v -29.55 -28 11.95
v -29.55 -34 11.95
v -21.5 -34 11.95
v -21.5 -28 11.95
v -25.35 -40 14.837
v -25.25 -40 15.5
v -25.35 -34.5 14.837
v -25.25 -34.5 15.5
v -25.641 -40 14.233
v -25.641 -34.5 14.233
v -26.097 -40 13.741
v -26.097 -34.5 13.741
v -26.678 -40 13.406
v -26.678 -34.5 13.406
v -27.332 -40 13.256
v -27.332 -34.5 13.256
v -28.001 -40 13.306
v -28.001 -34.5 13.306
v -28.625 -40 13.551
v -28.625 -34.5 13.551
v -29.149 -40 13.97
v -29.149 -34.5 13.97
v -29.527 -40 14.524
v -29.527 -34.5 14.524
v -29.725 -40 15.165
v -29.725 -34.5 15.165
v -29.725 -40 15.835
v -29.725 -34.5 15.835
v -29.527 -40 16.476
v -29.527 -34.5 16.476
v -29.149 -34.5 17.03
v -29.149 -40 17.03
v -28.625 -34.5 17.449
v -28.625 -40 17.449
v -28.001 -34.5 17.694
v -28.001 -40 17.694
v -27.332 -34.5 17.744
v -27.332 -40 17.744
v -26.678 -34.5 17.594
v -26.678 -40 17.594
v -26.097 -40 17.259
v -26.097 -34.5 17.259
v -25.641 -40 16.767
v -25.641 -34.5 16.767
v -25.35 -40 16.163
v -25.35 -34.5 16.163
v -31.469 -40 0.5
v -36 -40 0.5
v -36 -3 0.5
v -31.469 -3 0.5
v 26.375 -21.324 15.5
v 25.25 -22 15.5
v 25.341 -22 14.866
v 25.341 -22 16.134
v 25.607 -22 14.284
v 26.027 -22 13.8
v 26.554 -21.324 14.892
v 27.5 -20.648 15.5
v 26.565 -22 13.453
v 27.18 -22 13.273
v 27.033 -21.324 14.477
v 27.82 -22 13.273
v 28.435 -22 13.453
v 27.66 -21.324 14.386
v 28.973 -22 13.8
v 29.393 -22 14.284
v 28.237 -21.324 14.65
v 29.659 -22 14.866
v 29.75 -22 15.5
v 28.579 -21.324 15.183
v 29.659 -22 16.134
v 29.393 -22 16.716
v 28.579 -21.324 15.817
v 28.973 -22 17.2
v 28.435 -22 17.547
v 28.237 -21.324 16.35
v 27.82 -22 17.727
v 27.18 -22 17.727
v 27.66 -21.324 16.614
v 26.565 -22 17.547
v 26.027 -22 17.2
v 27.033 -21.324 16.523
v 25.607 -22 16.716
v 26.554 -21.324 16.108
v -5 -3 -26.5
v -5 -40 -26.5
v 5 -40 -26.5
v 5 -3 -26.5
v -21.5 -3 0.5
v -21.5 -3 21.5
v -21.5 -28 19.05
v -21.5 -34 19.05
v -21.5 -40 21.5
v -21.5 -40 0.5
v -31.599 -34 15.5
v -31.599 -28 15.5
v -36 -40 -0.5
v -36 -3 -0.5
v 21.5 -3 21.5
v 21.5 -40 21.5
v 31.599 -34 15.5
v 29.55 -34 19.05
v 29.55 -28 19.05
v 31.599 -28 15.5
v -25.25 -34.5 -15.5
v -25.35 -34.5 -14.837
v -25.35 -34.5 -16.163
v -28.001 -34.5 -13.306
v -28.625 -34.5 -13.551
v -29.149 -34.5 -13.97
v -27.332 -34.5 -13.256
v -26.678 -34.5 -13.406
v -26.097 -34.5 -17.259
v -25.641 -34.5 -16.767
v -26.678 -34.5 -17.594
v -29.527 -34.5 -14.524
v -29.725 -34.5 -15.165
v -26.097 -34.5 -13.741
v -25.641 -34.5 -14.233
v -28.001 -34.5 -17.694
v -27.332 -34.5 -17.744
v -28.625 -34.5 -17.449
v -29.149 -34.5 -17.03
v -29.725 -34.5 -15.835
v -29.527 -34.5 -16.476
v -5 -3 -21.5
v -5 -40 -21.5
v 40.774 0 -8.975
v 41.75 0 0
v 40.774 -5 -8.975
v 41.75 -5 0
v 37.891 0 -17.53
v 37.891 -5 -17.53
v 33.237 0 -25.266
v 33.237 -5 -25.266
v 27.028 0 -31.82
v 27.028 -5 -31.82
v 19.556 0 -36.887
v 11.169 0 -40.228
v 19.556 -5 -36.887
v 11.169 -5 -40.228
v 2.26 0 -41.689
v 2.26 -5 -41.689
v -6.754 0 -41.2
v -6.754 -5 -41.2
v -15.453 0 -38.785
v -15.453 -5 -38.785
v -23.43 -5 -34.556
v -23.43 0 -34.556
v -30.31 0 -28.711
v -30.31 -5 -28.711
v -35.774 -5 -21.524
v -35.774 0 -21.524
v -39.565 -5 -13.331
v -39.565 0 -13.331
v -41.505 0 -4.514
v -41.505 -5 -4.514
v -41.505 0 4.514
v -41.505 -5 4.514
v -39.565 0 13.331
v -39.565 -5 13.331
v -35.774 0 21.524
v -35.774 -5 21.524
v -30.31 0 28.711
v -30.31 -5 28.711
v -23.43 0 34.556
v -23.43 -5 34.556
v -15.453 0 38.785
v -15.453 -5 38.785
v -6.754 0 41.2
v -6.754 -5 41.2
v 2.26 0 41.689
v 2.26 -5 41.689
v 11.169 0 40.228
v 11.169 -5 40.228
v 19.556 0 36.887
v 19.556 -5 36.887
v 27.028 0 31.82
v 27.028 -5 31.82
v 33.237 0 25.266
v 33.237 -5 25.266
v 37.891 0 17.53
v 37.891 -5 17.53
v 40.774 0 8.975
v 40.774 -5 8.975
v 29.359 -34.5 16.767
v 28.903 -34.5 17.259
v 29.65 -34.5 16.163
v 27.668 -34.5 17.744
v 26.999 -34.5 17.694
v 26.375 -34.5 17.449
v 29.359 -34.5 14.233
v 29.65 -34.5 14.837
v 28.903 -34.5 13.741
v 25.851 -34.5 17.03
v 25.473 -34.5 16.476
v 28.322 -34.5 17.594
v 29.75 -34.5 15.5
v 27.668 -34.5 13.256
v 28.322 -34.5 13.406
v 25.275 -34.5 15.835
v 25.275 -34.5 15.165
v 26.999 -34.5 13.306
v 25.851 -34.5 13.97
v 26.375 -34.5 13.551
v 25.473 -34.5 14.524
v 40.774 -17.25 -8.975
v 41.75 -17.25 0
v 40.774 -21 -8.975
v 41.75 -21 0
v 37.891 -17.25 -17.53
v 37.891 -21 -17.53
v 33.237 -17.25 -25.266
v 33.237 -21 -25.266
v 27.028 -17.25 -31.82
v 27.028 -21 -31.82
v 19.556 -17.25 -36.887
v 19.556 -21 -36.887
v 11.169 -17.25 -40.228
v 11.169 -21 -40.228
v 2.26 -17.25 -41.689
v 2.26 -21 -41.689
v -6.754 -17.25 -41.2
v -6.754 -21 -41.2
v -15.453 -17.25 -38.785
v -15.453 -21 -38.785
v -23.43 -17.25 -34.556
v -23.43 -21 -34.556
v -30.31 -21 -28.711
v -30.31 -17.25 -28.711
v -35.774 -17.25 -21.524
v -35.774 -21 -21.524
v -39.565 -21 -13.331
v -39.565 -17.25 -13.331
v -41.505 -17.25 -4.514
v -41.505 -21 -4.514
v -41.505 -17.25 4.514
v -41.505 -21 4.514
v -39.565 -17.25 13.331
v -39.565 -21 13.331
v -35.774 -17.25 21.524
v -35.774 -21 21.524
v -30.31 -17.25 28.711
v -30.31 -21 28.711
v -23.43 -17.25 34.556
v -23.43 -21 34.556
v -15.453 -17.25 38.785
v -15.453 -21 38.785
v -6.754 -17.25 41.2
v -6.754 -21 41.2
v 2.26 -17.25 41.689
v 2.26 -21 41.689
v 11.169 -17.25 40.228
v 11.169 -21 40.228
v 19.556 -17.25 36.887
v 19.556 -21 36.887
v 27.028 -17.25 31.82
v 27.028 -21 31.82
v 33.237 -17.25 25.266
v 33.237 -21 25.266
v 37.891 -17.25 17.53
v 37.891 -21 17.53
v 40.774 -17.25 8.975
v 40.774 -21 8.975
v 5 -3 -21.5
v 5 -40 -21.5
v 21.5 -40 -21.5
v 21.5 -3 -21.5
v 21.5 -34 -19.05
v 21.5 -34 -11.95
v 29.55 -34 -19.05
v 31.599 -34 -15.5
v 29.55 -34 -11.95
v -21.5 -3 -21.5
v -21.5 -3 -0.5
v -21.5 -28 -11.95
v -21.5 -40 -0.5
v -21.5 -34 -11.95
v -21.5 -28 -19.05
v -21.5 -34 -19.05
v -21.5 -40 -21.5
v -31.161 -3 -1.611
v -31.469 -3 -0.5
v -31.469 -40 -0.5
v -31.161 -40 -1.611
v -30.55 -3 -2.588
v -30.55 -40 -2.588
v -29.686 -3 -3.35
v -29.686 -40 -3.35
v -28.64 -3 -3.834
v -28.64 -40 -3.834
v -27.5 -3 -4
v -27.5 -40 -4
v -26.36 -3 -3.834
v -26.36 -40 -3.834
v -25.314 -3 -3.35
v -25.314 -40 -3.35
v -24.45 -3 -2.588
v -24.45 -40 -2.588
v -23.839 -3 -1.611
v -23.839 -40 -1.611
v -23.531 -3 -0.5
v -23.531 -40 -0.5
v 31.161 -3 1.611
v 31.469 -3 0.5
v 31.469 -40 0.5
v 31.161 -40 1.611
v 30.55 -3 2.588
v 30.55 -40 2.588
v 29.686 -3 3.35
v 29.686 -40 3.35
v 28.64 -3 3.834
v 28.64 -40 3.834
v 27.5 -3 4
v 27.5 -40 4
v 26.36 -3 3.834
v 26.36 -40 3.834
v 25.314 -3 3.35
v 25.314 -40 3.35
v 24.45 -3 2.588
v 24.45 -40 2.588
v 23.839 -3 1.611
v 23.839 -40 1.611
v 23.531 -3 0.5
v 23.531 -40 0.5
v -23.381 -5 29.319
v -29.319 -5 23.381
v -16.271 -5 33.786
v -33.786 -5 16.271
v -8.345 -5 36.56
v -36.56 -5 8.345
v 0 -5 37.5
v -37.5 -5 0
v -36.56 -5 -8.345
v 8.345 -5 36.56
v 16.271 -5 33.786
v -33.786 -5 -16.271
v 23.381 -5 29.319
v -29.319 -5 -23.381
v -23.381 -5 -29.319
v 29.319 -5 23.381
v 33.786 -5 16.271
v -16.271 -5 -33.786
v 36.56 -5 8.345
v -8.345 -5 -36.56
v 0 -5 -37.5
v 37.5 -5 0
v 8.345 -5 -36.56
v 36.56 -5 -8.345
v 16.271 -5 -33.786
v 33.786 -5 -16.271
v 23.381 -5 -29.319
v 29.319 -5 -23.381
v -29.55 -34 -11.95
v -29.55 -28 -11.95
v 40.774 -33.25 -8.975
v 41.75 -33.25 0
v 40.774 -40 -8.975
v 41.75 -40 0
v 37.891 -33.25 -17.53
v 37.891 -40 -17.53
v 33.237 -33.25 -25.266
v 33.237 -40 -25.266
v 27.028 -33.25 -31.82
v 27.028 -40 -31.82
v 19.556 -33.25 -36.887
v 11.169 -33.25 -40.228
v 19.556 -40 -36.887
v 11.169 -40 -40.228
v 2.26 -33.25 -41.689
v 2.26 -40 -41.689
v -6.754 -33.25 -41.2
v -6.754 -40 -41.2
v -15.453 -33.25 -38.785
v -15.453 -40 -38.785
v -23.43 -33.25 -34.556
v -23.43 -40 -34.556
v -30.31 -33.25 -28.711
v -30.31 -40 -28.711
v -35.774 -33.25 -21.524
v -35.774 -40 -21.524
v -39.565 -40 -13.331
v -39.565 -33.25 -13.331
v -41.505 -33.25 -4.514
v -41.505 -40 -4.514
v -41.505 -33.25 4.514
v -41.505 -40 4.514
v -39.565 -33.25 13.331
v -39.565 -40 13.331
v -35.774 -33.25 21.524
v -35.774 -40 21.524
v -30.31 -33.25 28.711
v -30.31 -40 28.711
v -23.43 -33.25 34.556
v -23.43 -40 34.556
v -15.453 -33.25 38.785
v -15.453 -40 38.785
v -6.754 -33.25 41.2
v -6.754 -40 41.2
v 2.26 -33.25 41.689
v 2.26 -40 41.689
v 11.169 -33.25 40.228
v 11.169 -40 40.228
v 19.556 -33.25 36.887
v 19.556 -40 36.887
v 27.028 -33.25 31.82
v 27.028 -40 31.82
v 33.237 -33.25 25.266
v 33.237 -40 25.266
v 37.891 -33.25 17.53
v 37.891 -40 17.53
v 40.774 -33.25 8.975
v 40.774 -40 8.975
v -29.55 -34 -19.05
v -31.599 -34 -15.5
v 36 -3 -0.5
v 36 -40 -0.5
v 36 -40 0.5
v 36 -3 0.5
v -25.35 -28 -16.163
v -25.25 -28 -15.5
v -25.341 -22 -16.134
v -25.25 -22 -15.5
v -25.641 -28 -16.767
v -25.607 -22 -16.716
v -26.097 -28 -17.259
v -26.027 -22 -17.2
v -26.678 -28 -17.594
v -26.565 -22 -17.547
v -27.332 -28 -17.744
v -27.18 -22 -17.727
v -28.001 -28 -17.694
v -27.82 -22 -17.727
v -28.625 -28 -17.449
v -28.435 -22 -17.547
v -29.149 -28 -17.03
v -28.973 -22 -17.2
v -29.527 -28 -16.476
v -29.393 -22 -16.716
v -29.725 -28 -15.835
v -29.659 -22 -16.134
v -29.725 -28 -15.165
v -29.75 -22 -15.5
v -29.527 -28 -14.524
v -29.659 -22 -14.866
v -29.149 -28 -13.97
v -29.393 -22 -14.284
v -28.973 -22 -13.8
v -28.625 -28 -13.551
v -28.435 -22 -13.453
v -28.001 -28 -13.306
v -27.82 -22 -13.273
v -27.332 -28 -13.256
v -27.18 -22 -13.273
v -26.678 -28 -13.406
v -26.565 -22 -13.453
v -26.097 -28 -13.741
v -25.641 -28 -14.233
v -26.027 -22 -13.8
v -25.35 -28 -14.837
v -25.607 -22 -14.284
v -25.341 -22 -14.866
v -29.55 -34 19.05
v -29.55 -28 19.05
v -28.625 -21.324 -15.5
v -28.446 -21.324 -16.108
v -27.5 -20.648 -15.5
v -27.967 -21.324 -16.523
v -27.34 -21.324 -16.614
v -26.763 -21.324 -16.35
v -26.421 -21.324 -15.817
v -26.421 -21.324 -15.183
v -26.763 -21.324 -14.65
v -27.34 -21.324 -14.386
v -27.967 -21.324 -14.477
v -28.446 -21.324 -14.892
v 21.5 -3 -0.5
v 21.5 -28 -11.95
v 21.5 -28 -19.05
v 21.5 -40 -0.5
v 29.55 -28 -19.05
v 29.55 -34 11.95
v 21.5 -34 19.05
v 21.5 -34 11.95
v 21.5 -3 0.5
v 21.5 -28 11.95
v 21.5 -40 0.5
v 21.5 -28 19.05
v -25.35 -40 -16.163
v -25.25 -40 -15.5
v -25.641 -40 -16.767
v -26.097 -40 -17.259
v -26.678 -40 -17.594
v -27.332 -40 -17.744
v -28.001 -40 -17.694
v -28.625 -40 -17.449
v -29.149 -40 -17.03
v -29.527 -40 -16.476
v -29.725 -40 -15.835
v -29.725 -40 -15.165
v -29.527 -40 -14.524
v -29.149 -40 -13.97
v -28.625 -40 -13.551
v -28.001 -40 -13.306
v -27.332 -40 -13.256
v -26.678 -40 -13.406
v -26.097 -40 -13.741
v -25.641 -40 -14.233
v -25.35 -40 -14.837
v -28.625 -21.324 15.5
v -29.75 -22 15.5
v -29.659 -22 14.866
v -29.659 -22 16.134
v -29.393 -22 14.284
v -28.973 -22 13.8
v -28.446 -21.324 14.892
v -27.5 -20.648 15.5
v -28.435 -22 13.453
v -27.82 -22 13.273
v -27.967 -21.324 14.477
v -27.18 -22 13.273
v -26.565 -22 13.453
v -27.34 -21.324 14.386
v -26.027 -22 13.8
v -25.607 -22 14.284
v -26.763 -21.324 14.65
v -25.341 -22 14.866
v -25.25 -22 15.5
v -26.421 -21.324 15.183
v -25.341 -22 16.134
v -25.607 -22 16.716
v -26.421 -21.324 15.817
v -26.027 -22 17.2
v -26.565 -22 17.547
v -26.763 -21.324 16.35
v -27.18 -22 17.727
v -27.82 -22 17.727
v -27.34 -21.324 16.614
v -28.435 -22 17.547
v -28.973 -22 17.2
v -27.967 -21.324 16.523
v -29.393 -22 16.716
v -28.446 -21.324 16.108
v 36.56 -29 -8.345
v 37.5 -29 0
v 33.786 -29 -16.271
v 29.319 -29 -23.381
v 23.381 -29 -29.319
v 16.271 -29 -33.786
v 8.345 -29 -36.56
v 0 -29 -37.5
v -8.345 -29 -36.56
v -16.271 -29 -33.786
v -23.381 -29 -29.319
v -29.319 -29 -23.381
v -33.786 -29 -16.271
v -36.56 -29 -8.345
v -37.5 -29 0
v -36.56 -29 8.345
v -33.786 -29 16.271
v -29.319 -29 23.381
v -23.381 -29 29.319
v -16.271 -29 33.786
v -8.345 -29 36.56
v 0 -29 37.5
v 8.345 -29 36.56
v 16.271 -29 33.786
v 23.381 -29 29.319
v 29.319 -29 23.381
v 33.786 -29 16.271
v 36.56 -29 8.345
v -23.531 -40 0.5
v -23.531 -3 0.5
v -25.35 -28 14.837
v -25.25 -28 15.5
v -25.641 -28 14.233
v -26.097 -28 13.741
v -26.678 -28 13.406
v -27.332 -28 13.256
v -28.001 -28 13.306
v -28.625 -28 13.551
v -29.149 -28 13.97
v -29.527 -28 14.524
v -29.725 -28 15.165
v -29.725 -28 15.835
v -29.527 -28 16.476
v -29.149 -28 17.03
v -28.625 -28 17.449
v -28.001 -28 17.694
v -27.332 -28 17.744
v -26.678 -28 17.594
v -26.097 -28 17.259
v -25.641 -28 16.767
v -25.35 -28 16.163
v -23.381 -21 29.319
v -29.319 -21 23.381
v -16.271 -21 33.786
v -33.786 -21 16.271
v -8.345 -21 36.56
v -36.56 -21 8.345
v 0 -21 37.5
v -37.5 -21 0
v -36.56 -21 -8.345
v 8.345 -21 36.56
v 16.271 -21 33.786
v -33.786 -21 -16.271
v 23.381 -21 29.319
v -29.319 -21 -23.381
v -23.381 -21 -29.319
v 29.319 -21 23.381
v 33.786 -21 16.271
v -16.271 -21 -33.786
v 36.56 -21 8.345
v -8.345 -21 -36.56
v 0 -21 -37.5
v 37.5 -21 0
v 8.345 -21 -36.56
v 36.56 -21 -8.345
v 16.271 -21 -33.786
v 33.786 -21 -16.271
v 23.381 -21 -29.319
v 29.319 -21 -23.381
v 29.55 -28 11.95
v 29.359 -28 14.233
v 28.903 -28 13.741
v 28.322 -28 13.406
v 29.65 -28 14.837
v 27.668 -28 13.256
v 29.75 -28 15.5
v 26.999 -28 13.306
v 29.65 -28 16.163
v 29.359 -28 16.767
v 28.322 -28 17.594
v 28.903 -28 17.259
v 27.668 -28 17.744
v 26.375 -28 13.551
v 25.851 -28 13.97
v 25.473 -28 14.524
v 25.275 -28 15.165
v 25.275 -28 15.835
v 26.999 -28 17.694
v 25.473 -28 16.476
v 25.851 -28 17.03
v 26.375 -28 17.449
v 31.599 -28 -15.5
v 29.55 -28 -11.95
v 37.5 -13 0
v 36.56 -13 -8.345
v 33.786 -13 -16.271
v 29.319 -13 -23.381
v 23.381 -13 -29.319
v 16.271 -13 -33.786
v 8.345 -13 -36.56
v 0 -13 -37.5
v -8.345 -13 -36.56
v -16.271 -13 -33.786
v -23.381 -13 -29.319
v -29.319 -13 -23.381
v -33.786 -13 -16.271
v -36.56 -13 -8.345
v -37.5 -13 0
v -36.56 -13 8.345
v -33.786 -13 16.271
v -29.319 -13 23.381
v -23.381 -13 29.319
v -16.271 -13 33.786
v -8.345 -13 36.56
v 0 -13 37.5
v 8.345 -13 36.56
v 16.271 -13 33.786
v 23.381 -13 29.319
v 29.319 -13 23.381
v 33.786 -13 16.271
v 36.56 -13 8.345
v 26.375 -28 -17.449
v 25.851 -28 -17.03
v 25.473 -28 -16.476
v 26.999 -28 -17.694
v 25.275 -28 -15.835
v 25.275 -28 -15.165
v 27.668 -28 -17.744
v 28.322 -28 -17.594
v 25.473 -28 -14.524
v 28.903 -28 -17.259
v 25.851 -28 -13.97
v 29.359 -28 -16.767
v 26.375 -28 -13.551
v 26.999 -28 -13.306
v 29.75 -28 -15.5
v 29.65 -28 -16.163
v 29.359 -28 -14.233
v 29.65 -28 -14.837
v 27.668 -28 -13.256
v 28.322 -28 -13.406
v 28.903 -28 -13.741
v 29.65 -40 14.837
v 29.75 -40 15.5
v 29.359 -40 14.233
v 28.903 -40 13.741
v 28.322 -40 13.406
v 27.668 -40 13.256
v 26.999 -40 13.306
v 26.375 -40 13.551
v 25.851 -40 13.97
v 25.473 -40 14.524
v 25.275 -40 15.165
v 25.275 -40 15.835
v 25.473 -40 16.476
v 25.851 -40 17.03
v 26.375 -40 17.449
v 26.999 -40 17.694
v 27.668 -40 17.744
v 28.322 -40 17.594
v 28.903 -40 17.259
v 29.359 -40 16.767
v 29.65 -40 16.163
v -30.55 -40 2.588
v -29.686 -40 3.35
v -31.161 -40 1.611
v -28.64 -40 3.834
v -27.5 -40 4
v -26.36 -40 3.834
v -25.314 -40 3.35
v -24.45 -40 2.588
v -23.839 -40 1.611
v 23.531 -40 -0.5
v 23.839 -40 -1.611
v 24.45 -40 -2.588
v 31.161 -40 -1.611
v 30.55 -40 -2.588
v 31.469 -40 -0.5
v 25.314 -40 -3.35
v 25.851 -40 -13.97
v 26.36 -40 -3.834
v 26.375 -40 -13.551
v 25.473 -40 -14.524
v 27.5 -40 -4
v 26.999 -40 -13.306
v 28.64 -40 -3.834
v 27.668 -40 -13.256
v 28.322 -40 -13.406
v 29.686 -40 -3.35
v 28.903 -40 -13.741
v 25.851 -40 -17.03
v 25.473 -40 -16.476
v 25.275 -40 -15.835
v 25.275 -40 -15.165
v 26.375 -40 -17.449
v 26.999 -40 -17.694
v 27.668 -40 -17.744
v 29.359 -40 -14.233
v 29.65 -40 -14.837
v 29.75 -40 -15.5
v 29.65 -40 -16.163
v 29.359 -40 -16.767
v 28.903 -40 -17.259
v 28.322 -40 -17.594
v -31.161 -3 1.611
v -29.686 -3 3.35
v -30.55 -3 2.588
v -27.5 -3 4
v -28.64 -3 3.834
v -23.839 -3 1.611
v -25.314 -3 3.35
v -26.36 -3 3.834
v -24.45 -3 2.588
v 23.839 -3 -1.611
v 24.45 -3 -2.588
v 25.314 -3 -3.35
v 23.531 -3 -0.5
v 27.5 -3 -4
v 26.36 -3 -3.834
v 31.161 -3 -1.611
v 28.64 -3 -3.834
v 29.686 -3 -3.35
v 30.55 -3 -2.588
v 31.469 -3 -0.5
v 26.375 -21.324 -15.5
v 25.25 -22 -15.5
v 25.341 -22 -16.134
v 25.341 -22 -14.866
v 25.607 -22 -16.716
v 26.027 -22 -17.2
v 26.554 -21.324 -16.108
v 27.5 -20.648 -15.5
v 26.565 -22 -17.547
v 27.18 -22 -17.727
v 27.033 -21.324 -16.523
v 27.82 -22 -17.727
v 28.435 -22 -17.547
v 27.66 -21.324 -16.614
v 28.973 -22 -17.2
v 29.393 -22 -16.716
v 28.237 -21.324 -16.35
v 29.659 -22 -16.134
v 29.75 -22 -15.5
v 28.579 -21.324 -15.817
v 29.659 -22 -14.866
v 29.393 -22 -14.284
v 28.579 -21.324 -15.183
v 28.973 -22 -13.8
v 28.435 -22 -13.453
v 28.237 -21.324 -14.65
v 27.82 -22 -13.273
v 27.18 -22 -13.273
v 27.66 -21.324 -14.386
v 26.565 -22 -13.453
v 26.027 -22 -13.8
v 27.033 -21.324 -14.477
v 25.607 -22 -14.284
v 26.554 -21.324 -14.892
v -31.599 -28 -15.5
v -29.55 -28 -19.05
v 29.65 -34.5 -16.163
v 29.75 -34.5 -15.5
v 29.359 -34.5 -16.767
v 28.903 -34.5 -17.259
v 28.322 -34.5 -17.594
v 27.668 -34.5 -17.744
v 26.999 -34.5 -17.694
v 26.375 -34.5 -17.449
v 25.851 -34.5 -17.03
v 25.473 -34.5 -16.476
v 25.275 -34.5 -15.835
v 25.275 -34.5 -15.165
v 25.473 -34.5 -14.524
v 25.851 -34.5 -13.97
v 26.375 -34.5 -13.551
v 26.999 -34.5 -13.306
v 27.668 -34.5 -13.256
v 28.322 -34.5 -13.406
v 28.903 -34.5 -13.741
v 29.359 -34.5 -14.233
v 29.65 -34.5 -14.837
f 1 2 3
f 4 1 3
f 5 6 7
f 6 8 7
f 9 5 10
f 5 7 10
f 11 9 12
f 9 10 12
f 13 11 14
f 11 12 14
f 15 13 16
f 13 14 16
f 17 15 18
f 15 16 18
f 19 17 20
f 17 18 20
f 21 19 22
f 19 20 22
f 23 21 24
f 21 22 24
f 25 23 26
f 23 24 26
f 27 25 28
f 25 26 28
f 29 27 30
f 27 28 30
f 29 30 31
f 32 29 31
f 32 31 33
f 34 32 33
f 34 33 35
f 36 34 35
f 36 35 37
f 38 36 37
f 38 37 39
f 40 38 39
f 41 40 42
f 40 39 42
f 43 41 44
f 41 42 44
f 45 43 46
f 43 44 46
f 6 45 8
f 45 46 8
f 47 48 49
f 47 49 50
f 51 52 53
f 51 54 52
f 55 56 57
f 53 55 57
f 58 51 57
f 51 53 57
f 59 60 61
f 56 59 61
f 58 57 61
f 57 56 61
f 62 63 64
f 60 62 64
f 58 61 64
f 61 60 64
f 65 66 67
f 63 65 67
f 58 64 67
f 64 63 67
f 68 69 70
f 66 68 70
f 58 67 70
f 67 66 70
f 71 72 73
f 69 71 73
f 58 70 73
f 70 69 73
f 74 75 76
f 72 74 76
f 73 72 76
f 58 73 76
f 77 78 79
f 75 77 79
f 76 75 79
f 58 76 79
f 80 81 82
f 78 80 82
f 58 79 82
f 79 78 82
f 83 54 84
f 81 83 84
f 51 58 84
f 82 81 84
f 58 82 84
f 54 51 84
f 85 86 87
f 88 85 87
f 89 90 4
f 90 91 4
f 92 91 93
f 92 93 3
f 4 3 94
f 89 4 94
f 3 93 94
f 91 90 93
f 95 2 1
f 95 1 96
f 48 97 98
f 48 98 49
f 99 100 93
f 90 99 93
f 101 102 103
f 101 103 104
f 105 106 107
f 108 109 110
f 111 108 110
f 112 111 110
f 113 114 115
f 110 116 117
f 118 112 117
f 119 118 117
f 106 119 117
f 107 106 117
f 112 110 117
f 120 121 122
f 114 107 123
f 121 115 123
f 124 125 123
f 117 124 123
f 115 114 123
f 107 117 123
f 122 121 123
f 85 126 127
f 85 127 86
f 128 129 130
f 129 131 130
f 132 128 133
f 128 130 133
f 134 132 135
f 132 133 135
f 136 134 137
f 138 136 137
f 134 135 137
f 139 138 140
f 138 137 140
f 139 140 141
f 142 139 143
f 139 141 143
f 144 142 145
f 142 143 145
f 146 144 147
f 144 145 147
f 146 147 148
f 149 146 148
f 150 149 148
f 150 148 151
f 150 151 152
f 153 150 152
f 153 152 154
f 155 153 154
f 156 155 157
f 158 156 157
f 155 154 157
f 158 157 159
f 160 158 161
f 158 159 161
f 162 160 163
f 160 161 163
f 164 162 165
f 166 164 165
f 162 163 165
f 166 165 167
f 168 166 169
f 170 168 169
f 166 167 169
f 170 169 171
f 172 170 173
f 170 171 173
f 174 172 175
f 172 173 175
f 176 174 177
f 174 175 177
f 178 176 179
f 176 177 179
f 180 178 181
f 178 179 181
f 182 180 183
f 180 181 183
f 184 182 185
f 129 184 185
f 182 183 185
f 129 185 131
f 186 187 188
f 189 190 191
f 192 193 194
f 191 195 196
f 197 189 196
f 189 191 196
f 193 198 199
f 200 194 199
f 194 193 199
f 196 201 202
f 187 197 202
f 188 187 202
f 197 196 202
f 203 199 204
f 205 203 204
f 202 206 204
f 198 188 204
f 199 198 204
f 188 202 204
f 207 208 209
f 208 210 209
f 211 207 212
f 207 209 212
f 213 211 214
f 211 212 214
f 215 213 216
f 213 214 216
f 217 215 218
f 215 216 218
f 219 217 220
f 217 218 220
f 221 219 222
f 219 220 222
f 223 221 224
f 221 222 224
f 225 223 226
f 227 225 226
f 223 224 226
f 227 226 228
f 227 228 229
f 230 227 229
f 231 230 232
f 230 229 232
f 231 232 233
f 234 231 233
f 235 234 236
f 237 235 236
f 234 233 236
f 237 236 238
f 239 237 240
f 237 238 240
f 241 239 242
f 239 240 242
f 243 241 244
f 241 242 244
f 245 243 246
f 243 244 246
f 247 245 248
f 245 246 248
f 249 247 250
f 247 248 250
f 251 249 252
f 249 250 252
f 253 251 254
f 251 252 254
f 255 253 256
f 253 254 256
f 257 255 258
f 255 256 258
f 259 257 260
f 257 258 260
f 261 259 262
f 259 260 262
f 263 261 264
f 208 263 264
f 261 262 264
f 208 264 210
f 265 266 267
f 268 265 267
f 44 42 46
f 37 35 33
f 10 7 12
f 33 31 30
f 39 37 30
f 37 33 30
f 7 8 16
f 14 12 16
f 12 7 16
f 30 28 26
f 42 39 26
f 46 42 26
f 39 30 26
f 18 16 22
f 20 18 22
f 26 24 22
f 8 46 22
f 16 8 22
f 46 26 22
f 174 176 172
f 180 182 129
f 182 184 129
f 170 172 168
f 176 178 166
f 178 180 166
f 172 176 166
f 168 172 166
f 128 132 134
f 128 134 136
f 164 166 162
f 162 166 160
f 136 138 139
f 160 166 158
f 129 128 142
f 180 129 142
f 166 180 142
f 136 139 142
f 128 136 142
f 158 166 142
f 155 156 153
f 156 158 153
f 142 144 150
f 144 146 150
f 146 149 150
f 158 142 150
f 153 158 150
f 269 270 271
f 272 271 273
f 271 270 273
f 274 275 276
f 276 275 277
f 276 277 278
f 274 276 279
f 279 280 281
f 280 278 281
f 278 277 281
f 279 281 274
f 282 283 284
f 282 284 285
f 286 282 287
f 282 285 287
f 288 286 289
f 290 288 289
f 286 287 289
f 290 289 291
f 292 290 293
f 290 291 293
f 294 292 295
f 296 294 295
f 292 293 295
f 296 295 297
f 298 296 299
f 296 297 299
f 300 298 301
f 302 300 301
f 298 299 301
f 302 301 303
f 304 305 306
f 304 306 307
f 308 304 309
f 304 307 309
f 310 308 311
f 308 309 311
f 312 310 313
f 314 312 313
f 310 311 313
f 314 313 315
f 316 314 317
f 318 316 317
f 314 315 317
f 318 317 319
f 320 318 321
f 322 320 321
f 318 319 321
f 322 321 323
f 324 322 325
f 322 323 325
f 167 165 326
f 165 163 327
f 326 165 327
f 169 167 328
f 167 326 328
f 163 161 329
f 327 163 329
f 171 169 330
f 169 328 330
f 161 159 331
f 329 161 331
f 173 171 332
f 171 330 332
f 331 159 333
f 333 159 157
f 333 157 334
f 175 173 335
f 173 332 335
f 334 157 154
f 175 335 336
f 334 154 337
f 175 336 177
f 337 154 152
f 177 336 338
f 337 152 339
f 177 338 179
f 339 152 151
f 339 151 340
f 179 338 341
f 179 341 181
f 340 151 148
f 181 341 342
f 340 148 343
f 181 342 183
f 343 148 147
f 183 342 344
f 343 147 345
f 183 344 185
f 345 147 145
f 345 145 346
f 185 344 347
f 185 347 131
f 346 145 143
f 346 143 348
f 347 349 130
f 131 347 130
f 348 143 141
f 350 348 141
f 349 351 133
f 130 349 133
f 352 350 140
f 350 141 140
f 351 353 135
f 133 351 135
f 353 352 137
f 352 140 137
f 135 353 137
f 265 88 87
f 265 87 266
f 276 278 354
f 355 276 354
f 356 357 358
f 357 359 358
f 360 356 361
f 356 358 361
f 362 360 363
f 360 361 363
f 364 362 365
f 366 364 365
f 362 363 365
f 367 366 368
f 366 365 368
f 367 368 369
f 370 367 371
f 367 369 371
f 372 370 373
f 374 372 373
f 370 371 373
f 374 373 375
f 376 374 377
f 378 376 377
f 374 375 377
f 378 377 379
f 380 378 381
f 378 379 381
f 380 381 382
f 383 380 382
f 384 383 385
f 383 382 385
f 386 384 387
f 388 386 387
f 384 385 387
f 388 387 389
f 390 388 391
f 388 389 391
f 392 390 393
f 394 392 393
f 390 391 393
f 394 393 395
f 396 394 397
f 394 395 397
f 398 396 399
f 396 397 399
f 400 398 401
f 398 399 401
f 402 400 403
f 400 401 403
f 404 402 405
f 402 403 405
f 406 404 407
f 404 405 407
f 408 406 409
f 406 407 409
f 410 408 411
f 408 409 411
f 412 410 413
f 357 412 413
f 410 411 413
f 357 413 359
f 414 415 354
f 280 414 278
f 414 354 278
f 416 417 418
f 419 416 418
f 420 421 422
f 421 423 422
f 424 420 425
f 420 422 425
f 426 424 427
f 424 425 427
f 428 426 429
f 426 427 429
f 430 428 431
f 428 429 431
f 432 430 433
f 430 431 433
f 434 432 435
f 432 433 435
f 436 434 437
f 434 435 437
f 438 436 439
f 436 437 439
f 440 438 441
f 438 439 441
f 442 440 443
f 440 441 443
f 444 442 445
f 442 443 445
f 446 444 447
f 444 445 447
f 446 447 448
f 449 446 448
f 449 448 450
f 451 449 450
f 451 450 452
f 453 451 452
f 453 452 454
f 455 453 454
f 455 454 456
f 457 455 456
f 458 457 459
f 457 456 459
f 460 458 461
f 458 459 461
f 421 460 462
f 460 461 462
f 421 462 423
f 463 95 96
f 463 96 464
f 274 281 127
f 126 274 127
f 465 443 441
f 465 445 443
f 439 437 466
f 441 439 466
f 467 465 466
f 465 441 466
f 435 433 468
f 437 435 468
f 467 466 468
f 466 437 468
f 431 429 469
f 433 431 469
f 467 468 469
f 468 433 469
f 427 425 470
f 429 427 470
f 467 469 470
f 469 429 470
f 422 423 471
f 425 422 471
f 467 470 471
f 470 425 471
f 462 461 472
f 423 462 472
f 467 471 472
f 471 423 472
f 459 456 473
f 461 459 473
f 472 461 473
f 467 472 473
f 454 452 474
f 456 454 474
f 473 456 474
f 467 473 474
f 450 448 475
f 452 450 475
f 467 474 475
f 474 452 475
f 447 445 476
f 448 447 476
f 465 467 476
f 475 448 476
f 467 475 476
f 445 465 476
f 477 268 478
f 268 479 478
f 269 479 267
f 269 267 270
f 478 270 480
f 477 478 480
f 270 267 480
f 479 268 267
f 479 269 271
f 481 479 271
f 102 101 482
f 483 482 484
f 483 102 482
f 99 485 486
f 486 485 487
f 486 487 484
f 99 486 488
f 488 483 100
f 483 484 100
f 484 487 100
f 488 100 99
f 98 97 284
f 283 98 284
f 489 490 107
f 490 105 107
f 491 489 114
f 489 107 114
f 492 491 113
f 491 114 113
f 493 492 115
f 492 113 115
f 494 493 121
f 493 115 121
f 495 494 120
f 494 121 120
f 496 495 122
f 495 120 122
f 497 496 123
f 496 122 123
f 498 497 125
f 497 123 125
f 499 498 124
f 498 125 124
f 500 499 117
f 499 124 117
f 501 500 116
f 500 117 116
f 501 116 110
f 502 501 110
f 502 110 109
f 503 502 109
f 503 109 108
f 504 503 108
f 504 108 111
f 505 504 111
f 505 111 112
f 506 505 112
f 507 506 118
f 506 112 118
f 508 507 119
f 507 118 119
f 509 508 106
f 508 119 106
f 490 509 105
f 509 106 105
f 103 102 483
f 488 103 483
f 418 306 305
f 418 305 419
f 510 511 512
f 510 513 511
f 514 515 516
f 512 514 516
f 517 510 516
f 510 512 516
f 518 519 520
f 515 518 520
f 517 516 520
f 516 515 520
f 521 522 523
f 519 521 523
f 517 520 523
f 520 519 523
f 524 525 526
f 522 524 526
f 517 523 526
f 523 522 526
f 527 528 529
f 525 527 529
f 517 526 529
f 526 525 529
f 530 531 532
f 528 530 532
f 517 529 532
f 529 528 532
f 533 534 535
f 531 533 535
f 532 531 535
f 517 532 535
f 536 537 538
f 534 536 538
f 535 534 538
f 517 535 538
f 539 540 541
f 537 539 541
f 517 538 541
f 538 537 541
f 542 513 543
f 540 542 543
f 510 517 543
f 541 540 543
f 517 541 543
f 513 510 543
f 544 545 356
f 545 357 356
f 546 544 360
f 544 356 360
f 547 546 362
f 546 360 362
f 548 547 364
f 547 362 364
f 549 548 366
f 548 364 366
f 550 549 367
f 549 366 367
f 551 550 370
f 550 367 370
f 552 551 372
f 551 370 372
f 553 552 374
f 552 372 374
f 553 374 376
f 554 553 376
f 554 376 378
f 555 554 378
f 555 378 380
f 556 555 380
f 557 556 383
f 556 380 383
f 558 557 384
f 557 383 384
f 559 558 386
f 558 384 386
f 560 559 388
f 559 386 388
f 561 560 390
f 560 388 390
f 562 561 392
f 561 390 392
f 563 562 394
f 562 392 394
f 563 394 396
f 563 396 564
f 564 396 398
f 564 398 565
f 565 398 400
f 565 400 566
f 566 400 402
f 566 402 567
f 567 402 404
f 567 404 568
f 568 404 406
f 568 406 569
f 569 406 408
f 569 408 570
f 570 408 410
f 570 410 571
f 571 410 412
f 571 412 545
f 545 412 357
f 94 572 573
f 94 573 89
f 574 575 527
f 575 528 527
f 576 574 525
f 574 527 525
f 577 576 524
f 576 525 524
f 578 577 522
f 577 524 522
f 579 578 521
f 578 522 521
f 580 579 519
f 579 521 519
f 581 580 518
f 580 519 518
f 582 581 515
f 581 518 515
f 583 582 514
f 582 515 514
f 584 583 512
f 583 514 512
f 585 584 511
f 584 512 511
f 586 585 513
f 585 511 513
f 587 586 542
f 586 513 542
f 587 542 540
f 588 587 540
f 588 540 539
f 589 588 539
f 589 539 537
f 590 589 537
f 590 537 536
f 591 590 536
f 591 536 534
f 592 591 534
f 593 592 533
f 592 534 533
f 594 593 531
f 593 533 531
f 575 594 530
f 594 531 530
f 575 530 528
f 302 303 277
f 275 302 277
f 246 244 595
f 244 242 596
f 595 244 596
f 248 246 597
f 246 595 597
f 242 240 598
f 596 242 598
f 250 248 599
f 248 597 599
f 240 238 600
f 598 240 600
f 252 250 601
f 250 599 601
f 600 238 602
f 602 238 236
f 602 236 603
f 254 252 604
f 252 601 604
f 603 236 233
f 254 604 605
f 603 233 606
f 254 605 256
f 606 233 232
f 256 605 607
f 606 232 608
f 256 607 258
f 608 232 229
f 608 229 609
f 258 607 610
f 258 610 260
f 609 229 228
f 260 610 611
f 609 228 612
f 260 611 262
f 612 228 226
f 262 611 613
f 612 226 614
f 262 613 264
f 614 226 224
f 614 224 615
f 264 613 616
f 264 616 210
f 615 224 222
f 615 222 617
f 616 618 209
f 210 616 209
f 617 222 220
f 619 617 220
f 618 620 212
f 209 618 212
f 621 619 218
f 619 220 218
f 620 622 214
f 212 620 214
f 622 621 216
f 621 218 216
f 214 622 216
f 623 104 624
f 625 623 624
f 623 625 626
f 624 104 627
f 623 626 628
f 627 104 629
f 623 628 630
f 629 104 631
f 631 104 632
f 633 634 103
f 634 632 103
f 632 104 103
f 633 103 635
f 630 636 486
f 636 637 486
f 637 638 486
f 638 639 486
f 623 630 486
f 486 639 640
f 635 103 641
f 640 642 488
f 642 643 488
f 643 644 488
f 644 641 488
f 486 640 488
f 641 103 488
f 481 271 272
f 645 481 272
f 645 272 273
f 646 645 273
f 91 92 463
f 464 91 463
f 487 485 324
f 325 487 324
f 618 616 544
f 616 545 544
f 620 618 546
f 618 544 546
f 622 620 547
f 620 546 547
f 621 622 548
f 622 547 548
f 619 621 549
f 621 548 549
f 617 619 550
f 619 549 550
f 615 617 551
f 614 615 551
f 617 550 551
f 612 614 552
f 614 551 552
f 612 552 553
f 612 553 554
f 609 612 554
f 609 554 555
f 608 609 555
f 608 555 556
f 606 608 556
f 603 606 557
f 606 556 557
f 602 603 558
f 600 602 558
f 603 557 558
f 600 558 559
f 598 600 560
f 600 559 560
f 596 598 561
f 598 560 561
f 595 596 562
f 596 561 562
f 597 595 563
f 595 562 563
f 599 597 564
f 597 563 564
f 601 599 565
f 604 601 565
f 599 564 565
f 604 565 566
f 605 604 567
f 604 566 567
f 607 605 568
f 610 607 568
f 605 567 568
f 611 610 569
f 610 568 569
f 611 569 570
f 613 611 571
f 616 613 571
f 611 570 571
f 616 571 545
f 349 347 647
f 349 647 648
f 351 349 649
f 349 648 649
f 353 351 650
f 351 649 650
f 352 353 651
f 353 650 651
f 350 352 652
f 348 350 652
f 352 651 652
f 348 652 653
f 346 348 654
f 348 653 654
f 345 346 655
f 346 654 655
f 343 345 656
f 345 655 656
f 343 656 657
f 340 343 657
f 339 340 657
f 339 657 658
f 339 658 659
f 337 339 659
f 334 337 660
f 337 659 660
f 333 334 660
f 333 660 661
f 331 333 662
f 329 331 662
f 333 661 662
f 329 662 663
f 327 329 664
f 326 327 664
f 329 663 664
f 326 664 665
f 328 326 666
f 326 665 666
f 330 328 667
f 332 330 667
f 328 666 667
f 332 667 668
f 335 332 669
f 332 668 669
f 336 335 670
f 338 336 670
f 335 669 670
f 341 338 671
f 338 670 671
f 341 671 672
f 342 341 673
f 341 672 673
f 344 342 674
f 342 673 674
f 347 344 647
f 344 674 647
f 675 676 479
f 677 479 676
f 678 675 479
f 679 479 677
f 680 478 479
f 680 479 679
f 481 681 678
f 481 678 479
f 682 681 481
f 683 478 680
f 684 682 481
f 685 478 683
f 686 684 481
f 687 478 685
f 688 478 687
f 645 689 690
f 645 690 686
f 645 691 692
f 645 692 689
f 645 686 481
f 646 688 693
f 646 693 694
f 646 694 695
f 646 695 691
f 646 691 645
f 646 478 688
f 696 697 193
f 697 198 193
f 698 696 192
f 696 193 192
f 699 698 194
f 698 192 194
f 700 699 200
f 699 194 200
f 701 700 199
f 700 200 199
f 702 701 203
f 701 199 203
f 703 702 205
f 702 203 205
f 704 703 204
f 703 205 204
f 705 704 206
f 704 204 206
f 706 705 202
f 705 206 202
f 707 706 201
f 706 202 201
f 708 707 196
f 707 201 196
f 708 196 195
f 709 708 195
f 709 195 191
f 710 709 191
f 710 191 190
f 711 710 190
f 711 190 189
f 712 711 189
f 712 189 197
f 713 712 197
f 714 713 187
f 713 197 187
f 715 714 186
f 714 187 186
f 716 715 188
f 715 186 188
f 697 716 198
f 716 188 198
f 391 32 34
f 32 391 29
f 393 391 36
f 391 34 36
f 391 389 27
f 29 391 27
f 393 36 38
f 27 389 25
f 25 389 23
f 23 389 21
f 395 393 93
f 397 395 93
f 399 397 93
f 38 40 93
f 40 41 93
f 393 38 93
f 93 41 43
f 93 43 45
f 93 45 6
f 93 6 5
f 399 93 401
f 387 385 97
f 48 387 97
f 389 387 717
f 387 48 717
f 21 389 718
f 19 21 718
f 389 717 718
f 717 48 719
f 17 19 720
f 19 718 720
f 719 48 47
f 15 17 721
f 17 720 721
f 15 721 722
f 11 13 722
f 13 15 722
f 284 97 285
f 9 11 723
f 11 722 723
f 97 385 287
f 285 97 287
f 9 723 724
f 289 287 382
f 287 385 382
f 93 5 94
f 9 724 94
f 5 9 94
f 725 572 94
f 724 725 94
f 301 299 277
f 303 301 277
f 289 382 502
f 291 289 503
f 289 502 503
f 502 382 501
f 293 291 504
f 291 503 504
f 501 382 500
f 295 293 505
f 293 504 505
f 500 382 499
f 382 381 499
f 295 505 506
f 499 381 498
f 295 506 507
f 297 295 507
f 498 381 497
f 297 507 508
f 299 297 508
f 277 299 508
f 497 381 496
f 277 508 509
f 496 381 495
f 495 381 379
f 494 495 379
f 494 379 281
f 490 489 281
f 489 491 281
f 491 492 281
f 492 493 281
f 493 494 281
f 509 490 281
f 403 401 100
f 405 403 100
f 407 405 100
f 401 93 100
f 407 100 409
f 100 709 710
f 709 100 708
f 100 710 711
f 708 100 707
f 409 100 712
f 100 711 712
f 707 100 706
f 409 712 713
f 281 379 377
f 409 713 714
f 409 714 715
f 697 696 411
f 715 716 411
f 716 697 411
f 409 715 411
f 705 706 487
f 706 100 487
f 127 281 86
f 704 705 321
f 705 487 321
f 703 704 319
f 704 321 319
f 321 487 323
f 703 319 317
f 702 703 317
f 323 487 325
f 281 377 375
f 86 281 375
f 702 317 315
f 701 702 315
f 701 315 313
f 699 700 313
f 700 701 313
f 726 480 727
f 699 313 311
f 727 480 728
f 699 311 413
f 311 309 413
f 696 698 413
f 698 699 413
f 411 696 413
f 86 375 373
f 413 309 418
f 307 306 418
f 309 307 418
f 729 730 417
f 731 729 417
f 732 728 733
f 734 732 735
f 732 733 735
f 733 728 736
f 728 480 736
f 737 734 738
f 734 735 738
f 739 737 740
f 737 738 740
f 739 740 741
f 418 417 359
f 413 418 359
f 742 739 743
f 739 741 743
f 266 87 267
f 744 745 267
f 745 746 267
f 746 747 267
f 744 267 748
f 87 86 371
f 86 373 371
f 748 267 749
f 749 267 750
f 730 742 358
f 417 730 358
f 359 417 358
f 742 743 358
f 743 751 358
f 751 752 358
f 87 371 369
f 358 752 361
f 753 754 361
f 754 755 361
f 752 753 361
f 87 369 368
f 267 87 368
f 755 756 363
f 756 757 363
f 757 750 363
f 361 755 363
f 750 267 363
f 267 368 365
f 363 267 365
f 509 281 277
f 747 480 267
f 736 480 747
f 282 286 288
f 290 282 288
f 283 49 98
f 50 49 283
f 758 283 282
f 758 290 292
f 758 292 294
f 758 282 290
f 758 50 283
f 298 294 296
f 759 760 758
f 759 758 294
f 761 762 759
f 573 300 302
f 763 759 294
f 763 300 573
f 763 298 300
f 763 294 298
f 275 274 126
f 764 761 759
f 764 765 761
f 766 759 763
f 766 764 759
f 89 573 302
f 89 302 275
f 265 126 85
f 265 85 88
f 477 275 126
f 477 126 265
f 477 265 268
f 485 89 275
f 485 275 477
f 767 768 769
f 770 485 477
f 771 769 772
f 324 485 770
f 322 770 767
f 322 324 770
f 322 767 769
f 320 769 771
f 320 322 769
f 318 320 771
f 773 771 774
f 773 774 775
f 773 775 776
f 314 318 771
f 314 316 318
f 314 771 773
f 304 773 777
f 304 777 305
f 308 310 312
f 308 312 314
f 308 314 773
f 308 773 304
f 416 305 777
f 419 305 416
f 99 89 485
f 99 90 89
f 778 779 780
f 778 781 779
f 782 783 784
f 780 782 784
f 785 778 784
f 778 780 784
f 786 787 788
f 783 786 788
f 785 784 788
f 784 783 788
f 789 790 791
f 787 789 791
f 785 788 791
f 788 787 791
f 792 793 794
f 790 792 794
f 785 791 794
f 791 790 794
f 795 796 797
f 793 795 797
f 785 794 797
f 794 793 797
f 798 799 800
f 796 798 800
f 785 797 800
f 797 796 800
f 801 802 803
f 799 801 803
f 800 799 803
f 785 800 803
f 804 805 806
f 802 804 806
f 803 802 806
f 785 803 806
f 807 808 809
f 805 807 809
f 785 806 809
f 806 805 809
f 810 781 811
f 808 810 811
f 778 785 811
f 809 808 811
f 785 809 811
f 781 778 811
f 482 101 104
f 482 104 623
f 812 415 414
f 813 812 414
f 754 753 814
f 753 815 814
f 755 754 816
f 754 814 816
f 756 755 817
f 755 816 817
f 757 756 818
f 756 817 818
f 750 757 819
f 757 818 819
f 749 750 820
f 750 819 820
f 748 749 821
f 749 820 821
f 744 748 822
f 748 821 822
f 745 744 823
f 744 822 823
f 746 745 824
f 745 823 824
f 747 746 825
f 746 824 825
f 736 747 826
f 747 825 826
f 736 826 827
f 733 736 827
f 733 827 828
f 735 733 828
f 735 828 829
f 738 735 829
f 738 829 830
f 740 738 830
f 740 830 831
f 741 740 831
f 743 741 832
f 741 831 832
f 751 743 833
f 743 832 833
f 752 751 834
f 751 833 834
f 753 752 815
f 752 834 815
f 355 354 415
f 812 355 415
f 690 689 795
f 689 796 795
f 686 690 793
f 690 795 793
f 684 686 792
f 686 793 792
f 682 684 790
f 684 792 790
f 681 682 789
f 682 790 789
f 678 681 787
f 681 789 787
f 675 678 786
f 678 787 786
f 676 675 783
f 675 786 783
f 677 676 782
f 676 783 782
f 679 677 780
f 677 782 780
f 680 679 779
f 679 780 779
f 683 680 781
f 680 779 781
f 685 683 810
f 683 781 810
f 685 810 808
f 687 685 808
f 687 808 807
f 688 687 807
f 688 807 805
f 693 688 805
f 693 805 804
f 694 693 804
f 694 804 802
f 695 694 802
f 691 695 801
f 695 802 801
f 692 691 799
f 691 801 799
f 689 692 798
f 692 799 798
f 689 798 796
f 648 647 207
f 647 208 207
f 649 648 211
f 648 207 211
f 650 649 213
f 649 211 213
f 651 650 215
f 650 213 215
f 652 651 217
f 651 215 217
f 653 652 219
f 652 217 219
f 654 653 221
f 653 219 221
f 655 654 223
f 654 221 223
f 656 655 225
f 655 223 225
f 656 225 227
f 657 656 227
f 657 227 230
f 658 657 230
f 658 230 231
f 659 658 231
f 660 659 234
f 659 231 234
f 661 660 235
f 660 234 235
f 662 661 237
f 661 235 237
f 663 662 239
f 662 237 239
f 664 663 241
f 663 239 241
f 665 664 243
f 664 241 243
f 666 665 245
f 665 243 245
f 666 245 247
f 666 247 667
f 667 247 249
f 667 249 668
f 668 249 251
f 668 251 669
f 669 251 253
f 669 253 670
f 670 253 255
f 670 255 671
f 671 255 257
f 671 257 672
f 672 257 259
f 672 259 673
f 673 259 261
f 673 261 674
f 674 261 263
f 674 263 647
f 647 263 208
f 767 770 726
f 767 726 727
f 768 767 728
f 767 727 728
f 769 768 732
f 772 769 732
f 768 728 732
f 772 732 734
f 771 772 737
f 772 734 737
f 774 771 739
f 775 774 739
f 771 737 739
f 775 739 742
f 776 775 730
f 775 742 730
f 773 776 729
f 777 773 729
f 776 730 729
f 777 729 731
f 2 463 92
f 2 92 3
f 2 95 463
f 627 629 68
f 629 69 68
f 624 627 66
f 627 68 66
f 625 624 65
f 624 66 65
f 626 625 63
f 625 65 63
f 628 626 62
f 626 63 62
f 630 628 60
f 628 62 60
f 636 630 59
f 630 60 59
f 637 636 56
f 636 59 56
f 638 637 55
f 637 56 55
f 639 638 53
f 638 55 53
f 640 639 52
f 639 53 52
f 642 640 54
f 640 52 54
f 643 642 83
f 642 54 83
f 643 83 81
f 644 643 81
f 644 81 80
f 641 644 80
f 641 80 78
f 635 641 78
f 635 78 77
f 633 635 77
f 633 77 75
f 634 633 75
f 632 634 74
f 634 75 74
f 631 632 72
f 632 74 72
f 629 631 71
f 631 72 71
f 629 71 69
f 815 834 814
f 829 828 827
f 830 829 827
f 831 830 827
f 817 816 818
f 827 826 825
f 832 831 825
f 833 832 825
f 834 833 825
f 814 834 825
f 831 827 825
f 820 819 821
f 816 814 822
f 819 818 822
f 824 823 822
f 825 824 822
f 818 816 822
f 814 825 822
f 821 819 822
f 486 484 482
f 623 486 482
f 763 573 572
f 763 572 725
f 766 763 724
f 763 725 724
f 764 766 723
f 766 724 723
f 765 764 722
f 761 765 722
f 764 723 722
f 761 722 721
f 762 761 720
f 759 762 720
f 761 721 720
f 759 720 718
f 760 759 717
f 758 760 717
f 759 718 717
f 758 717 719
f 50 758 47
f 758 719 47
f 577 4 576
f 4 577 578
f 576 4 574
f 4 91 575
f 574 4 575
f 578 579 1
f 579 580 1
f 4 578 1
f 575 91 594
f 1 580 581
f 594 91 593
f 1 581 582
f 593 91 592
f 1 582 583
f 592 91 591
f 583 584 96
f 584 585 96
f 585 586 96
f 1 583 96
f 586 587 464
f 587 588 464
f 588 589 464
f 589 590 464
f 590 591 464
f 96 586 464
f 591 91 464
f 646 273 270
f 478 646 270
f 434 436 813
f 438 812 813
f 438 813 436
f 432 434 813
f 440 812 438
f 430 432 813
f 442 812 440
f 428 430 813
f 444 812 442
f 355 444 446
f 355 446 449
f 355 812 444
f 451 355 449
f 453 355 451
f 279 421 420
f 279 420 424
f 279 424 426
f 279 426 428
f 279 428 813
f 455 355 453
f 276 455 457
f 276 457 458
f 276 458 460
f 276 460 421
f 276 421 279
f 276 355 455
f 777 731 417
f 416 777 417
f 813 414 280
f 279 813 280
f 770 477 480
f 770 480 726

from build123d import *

# Parameters (mm, degrees)
CUT_EXTRUDE1_DEPTH       = 37
SKETCH3_R                = 4
CUT_EXTRUDE2_DEPTH       = 37
SKETCH4_W                = 72
SKETCH4_H                = 1
CUT_EXTRUDE3_DEPTH       = 37
M4_CLEARANCE_HOLE1_D     = 4.5
M4_CLEARANCE_HOLE1_DEPTH = 18
M4_CLEARANCE_HOLE1_TIP   = 1.351936393
CUT_EXTRUDE4_START       = -6
CUT_EXTRUDE4_DEPTH       = 6
SKETCH8_R                = 2.25
BOSS_EXTRUDE1_DEPTH      = 0.5


with BuildPart() as part:
    # Sketch1 → Revolve1 (revolve)
    with BuildSketch(Plane.XY, mode=Mode.PRIVATE) as revolve1_sk:
        Polygon((0, 0), (-41.75, 0), (-41.75, -5), (-37.5, -5), (-37.5, -13), (-41.75, -17.25), (-41.75, -21), (-37.5, -21), (-37.5, -29), (-41.75, -33.25), (-41.75, -40), (0, -40), align=None)
    revolve(revolve1_sk.sketch.rotate(Axis((0, -40, 0), (0, 1, 0)), 180), axis=Axis((0, -40, 0), (0, 1, 0)))

    # Sketch2 → Cut-Extrude1 (cut)
    with BuildSketch(Plane(origin=(0, -40, 0), x_dir=(1, 0, 0), z_dir=(0, 1, 0))):
        Polygon((-21.5, 21.5), (-5, 21.5), (-5, 26.5), (5, 26.5), (5, 21.5), (21.5, 21.5), (21.5, -21.5), (-21.5, -21.5), align=None)
    extrude(amount=CUT_EXTRUDE1_DEPTH, mode=Mode.SUBTRACT)

    # Sketch3 → Cut-Extrude2 (cut)
    with BuildSketch(Plane.XZ.offset(40)):
        with Locations((-27.5, 0)):
            Circle(SKETCH3_R)
        with Locations((27.5, 0)):
            Circle(SKETCH3_R)
    extrude(amount=-CUT_EXTRUDE2_DEPTH, mode=Mode.SUBTRACT)

    # Sketch4 → Cut-Extrude3 (cut)
    with BuildSketch(Plane.XZ.offset(40)):
        Rectangle(SKETCH4_W, SKETCH4_H)
    extrude(amount=-CUT_EXTRUDE3_DEPTH, mode=Mode.SUBTRACT)

    # M4 Clearance Hole1
    with Locations(Plane(origin=(0, -40, 0), x_dir=(-1, 0, 0), z_dir=(0, -1, 0))):
        with Locations((27.5, -15.5), (-27.5, -15.5), (-27.5, 15.5), (27.5, 15.5)):
            Hole(M4_CLEARANCE_HOLE1_D / 2, depth=M4_CLEARANCE_HOLE1_DEPTH)
            with Locations((0, 0, -(M4_CLEARANCE_HOLE1_DEPTH + M4_CLEARANCE_HOLE1_TIP / 2))):  # 118° drill point
                Cone(0, M4_CLEARANCE_HOLE1_D / 2, M4_CLEARANCE_HOLE1_TIP, mode=Mode.SUBTRACT)

    # Sketch7 → Cut-Extrude4 (cut)
    with BuildSketch(Plane.XZ.offset(40).offset(CUT_EXTRUDE4_START)):
        Polygon((-25.450406544, 19.05), (25.450406544, 19.05), (29.549593456, 19.05), (31.599186911, 15.5), (29.549593456, 11.95), (25.450406544, 11.95), (-25.450406544, 11.95), (-29.549593456, 11.95), (-31.599186911, 15.5), (-29.549593456, 19.05), align=None)
        Polygon((25.450406544, -11.95), (-25.450406544, -11.95), (-29.549593456, -11.95), (-31.599186911, -15.5), (-29.549593456, -19.05), (-25.450406544, -19.05), (25.450406544, -19.05), (29.549593456, -19.05), (31.599186911, -15.5), (29.549593456, -11.95), align=None)
    extrude(amount=-CUT_EXTRUDE4_DEPTH, mode=Mode.SUBTRACT)

    # Sketch8 → Boss-Extrude1 (add)
    with BuildSketch(Plane(origin=(0, -34, 0), x_dir=(1, 0, 0), z_dir=(0, 1, 0))):
        with Locations(Location((-27.5, -15.5, 0), (0, 0, 90))):
            Circle(SKETCH8_R)
        with Locations(Location((-27.5, 15.5, 0), (0, 0, 90))):
            Circle(SKETCH8_R)
        with Locations(Location((27.5, 15.5, 0), (0, 0, 90))):
            Circle(SKETCH8_R)
        with Locations(Location((27.5, -15.5, 0), (0, 0, 90))):
            Circle(SKETCH8_R)
    extrude(amount=-BOSS_EXTRUDE1_DEPTH)


solid = part.part
